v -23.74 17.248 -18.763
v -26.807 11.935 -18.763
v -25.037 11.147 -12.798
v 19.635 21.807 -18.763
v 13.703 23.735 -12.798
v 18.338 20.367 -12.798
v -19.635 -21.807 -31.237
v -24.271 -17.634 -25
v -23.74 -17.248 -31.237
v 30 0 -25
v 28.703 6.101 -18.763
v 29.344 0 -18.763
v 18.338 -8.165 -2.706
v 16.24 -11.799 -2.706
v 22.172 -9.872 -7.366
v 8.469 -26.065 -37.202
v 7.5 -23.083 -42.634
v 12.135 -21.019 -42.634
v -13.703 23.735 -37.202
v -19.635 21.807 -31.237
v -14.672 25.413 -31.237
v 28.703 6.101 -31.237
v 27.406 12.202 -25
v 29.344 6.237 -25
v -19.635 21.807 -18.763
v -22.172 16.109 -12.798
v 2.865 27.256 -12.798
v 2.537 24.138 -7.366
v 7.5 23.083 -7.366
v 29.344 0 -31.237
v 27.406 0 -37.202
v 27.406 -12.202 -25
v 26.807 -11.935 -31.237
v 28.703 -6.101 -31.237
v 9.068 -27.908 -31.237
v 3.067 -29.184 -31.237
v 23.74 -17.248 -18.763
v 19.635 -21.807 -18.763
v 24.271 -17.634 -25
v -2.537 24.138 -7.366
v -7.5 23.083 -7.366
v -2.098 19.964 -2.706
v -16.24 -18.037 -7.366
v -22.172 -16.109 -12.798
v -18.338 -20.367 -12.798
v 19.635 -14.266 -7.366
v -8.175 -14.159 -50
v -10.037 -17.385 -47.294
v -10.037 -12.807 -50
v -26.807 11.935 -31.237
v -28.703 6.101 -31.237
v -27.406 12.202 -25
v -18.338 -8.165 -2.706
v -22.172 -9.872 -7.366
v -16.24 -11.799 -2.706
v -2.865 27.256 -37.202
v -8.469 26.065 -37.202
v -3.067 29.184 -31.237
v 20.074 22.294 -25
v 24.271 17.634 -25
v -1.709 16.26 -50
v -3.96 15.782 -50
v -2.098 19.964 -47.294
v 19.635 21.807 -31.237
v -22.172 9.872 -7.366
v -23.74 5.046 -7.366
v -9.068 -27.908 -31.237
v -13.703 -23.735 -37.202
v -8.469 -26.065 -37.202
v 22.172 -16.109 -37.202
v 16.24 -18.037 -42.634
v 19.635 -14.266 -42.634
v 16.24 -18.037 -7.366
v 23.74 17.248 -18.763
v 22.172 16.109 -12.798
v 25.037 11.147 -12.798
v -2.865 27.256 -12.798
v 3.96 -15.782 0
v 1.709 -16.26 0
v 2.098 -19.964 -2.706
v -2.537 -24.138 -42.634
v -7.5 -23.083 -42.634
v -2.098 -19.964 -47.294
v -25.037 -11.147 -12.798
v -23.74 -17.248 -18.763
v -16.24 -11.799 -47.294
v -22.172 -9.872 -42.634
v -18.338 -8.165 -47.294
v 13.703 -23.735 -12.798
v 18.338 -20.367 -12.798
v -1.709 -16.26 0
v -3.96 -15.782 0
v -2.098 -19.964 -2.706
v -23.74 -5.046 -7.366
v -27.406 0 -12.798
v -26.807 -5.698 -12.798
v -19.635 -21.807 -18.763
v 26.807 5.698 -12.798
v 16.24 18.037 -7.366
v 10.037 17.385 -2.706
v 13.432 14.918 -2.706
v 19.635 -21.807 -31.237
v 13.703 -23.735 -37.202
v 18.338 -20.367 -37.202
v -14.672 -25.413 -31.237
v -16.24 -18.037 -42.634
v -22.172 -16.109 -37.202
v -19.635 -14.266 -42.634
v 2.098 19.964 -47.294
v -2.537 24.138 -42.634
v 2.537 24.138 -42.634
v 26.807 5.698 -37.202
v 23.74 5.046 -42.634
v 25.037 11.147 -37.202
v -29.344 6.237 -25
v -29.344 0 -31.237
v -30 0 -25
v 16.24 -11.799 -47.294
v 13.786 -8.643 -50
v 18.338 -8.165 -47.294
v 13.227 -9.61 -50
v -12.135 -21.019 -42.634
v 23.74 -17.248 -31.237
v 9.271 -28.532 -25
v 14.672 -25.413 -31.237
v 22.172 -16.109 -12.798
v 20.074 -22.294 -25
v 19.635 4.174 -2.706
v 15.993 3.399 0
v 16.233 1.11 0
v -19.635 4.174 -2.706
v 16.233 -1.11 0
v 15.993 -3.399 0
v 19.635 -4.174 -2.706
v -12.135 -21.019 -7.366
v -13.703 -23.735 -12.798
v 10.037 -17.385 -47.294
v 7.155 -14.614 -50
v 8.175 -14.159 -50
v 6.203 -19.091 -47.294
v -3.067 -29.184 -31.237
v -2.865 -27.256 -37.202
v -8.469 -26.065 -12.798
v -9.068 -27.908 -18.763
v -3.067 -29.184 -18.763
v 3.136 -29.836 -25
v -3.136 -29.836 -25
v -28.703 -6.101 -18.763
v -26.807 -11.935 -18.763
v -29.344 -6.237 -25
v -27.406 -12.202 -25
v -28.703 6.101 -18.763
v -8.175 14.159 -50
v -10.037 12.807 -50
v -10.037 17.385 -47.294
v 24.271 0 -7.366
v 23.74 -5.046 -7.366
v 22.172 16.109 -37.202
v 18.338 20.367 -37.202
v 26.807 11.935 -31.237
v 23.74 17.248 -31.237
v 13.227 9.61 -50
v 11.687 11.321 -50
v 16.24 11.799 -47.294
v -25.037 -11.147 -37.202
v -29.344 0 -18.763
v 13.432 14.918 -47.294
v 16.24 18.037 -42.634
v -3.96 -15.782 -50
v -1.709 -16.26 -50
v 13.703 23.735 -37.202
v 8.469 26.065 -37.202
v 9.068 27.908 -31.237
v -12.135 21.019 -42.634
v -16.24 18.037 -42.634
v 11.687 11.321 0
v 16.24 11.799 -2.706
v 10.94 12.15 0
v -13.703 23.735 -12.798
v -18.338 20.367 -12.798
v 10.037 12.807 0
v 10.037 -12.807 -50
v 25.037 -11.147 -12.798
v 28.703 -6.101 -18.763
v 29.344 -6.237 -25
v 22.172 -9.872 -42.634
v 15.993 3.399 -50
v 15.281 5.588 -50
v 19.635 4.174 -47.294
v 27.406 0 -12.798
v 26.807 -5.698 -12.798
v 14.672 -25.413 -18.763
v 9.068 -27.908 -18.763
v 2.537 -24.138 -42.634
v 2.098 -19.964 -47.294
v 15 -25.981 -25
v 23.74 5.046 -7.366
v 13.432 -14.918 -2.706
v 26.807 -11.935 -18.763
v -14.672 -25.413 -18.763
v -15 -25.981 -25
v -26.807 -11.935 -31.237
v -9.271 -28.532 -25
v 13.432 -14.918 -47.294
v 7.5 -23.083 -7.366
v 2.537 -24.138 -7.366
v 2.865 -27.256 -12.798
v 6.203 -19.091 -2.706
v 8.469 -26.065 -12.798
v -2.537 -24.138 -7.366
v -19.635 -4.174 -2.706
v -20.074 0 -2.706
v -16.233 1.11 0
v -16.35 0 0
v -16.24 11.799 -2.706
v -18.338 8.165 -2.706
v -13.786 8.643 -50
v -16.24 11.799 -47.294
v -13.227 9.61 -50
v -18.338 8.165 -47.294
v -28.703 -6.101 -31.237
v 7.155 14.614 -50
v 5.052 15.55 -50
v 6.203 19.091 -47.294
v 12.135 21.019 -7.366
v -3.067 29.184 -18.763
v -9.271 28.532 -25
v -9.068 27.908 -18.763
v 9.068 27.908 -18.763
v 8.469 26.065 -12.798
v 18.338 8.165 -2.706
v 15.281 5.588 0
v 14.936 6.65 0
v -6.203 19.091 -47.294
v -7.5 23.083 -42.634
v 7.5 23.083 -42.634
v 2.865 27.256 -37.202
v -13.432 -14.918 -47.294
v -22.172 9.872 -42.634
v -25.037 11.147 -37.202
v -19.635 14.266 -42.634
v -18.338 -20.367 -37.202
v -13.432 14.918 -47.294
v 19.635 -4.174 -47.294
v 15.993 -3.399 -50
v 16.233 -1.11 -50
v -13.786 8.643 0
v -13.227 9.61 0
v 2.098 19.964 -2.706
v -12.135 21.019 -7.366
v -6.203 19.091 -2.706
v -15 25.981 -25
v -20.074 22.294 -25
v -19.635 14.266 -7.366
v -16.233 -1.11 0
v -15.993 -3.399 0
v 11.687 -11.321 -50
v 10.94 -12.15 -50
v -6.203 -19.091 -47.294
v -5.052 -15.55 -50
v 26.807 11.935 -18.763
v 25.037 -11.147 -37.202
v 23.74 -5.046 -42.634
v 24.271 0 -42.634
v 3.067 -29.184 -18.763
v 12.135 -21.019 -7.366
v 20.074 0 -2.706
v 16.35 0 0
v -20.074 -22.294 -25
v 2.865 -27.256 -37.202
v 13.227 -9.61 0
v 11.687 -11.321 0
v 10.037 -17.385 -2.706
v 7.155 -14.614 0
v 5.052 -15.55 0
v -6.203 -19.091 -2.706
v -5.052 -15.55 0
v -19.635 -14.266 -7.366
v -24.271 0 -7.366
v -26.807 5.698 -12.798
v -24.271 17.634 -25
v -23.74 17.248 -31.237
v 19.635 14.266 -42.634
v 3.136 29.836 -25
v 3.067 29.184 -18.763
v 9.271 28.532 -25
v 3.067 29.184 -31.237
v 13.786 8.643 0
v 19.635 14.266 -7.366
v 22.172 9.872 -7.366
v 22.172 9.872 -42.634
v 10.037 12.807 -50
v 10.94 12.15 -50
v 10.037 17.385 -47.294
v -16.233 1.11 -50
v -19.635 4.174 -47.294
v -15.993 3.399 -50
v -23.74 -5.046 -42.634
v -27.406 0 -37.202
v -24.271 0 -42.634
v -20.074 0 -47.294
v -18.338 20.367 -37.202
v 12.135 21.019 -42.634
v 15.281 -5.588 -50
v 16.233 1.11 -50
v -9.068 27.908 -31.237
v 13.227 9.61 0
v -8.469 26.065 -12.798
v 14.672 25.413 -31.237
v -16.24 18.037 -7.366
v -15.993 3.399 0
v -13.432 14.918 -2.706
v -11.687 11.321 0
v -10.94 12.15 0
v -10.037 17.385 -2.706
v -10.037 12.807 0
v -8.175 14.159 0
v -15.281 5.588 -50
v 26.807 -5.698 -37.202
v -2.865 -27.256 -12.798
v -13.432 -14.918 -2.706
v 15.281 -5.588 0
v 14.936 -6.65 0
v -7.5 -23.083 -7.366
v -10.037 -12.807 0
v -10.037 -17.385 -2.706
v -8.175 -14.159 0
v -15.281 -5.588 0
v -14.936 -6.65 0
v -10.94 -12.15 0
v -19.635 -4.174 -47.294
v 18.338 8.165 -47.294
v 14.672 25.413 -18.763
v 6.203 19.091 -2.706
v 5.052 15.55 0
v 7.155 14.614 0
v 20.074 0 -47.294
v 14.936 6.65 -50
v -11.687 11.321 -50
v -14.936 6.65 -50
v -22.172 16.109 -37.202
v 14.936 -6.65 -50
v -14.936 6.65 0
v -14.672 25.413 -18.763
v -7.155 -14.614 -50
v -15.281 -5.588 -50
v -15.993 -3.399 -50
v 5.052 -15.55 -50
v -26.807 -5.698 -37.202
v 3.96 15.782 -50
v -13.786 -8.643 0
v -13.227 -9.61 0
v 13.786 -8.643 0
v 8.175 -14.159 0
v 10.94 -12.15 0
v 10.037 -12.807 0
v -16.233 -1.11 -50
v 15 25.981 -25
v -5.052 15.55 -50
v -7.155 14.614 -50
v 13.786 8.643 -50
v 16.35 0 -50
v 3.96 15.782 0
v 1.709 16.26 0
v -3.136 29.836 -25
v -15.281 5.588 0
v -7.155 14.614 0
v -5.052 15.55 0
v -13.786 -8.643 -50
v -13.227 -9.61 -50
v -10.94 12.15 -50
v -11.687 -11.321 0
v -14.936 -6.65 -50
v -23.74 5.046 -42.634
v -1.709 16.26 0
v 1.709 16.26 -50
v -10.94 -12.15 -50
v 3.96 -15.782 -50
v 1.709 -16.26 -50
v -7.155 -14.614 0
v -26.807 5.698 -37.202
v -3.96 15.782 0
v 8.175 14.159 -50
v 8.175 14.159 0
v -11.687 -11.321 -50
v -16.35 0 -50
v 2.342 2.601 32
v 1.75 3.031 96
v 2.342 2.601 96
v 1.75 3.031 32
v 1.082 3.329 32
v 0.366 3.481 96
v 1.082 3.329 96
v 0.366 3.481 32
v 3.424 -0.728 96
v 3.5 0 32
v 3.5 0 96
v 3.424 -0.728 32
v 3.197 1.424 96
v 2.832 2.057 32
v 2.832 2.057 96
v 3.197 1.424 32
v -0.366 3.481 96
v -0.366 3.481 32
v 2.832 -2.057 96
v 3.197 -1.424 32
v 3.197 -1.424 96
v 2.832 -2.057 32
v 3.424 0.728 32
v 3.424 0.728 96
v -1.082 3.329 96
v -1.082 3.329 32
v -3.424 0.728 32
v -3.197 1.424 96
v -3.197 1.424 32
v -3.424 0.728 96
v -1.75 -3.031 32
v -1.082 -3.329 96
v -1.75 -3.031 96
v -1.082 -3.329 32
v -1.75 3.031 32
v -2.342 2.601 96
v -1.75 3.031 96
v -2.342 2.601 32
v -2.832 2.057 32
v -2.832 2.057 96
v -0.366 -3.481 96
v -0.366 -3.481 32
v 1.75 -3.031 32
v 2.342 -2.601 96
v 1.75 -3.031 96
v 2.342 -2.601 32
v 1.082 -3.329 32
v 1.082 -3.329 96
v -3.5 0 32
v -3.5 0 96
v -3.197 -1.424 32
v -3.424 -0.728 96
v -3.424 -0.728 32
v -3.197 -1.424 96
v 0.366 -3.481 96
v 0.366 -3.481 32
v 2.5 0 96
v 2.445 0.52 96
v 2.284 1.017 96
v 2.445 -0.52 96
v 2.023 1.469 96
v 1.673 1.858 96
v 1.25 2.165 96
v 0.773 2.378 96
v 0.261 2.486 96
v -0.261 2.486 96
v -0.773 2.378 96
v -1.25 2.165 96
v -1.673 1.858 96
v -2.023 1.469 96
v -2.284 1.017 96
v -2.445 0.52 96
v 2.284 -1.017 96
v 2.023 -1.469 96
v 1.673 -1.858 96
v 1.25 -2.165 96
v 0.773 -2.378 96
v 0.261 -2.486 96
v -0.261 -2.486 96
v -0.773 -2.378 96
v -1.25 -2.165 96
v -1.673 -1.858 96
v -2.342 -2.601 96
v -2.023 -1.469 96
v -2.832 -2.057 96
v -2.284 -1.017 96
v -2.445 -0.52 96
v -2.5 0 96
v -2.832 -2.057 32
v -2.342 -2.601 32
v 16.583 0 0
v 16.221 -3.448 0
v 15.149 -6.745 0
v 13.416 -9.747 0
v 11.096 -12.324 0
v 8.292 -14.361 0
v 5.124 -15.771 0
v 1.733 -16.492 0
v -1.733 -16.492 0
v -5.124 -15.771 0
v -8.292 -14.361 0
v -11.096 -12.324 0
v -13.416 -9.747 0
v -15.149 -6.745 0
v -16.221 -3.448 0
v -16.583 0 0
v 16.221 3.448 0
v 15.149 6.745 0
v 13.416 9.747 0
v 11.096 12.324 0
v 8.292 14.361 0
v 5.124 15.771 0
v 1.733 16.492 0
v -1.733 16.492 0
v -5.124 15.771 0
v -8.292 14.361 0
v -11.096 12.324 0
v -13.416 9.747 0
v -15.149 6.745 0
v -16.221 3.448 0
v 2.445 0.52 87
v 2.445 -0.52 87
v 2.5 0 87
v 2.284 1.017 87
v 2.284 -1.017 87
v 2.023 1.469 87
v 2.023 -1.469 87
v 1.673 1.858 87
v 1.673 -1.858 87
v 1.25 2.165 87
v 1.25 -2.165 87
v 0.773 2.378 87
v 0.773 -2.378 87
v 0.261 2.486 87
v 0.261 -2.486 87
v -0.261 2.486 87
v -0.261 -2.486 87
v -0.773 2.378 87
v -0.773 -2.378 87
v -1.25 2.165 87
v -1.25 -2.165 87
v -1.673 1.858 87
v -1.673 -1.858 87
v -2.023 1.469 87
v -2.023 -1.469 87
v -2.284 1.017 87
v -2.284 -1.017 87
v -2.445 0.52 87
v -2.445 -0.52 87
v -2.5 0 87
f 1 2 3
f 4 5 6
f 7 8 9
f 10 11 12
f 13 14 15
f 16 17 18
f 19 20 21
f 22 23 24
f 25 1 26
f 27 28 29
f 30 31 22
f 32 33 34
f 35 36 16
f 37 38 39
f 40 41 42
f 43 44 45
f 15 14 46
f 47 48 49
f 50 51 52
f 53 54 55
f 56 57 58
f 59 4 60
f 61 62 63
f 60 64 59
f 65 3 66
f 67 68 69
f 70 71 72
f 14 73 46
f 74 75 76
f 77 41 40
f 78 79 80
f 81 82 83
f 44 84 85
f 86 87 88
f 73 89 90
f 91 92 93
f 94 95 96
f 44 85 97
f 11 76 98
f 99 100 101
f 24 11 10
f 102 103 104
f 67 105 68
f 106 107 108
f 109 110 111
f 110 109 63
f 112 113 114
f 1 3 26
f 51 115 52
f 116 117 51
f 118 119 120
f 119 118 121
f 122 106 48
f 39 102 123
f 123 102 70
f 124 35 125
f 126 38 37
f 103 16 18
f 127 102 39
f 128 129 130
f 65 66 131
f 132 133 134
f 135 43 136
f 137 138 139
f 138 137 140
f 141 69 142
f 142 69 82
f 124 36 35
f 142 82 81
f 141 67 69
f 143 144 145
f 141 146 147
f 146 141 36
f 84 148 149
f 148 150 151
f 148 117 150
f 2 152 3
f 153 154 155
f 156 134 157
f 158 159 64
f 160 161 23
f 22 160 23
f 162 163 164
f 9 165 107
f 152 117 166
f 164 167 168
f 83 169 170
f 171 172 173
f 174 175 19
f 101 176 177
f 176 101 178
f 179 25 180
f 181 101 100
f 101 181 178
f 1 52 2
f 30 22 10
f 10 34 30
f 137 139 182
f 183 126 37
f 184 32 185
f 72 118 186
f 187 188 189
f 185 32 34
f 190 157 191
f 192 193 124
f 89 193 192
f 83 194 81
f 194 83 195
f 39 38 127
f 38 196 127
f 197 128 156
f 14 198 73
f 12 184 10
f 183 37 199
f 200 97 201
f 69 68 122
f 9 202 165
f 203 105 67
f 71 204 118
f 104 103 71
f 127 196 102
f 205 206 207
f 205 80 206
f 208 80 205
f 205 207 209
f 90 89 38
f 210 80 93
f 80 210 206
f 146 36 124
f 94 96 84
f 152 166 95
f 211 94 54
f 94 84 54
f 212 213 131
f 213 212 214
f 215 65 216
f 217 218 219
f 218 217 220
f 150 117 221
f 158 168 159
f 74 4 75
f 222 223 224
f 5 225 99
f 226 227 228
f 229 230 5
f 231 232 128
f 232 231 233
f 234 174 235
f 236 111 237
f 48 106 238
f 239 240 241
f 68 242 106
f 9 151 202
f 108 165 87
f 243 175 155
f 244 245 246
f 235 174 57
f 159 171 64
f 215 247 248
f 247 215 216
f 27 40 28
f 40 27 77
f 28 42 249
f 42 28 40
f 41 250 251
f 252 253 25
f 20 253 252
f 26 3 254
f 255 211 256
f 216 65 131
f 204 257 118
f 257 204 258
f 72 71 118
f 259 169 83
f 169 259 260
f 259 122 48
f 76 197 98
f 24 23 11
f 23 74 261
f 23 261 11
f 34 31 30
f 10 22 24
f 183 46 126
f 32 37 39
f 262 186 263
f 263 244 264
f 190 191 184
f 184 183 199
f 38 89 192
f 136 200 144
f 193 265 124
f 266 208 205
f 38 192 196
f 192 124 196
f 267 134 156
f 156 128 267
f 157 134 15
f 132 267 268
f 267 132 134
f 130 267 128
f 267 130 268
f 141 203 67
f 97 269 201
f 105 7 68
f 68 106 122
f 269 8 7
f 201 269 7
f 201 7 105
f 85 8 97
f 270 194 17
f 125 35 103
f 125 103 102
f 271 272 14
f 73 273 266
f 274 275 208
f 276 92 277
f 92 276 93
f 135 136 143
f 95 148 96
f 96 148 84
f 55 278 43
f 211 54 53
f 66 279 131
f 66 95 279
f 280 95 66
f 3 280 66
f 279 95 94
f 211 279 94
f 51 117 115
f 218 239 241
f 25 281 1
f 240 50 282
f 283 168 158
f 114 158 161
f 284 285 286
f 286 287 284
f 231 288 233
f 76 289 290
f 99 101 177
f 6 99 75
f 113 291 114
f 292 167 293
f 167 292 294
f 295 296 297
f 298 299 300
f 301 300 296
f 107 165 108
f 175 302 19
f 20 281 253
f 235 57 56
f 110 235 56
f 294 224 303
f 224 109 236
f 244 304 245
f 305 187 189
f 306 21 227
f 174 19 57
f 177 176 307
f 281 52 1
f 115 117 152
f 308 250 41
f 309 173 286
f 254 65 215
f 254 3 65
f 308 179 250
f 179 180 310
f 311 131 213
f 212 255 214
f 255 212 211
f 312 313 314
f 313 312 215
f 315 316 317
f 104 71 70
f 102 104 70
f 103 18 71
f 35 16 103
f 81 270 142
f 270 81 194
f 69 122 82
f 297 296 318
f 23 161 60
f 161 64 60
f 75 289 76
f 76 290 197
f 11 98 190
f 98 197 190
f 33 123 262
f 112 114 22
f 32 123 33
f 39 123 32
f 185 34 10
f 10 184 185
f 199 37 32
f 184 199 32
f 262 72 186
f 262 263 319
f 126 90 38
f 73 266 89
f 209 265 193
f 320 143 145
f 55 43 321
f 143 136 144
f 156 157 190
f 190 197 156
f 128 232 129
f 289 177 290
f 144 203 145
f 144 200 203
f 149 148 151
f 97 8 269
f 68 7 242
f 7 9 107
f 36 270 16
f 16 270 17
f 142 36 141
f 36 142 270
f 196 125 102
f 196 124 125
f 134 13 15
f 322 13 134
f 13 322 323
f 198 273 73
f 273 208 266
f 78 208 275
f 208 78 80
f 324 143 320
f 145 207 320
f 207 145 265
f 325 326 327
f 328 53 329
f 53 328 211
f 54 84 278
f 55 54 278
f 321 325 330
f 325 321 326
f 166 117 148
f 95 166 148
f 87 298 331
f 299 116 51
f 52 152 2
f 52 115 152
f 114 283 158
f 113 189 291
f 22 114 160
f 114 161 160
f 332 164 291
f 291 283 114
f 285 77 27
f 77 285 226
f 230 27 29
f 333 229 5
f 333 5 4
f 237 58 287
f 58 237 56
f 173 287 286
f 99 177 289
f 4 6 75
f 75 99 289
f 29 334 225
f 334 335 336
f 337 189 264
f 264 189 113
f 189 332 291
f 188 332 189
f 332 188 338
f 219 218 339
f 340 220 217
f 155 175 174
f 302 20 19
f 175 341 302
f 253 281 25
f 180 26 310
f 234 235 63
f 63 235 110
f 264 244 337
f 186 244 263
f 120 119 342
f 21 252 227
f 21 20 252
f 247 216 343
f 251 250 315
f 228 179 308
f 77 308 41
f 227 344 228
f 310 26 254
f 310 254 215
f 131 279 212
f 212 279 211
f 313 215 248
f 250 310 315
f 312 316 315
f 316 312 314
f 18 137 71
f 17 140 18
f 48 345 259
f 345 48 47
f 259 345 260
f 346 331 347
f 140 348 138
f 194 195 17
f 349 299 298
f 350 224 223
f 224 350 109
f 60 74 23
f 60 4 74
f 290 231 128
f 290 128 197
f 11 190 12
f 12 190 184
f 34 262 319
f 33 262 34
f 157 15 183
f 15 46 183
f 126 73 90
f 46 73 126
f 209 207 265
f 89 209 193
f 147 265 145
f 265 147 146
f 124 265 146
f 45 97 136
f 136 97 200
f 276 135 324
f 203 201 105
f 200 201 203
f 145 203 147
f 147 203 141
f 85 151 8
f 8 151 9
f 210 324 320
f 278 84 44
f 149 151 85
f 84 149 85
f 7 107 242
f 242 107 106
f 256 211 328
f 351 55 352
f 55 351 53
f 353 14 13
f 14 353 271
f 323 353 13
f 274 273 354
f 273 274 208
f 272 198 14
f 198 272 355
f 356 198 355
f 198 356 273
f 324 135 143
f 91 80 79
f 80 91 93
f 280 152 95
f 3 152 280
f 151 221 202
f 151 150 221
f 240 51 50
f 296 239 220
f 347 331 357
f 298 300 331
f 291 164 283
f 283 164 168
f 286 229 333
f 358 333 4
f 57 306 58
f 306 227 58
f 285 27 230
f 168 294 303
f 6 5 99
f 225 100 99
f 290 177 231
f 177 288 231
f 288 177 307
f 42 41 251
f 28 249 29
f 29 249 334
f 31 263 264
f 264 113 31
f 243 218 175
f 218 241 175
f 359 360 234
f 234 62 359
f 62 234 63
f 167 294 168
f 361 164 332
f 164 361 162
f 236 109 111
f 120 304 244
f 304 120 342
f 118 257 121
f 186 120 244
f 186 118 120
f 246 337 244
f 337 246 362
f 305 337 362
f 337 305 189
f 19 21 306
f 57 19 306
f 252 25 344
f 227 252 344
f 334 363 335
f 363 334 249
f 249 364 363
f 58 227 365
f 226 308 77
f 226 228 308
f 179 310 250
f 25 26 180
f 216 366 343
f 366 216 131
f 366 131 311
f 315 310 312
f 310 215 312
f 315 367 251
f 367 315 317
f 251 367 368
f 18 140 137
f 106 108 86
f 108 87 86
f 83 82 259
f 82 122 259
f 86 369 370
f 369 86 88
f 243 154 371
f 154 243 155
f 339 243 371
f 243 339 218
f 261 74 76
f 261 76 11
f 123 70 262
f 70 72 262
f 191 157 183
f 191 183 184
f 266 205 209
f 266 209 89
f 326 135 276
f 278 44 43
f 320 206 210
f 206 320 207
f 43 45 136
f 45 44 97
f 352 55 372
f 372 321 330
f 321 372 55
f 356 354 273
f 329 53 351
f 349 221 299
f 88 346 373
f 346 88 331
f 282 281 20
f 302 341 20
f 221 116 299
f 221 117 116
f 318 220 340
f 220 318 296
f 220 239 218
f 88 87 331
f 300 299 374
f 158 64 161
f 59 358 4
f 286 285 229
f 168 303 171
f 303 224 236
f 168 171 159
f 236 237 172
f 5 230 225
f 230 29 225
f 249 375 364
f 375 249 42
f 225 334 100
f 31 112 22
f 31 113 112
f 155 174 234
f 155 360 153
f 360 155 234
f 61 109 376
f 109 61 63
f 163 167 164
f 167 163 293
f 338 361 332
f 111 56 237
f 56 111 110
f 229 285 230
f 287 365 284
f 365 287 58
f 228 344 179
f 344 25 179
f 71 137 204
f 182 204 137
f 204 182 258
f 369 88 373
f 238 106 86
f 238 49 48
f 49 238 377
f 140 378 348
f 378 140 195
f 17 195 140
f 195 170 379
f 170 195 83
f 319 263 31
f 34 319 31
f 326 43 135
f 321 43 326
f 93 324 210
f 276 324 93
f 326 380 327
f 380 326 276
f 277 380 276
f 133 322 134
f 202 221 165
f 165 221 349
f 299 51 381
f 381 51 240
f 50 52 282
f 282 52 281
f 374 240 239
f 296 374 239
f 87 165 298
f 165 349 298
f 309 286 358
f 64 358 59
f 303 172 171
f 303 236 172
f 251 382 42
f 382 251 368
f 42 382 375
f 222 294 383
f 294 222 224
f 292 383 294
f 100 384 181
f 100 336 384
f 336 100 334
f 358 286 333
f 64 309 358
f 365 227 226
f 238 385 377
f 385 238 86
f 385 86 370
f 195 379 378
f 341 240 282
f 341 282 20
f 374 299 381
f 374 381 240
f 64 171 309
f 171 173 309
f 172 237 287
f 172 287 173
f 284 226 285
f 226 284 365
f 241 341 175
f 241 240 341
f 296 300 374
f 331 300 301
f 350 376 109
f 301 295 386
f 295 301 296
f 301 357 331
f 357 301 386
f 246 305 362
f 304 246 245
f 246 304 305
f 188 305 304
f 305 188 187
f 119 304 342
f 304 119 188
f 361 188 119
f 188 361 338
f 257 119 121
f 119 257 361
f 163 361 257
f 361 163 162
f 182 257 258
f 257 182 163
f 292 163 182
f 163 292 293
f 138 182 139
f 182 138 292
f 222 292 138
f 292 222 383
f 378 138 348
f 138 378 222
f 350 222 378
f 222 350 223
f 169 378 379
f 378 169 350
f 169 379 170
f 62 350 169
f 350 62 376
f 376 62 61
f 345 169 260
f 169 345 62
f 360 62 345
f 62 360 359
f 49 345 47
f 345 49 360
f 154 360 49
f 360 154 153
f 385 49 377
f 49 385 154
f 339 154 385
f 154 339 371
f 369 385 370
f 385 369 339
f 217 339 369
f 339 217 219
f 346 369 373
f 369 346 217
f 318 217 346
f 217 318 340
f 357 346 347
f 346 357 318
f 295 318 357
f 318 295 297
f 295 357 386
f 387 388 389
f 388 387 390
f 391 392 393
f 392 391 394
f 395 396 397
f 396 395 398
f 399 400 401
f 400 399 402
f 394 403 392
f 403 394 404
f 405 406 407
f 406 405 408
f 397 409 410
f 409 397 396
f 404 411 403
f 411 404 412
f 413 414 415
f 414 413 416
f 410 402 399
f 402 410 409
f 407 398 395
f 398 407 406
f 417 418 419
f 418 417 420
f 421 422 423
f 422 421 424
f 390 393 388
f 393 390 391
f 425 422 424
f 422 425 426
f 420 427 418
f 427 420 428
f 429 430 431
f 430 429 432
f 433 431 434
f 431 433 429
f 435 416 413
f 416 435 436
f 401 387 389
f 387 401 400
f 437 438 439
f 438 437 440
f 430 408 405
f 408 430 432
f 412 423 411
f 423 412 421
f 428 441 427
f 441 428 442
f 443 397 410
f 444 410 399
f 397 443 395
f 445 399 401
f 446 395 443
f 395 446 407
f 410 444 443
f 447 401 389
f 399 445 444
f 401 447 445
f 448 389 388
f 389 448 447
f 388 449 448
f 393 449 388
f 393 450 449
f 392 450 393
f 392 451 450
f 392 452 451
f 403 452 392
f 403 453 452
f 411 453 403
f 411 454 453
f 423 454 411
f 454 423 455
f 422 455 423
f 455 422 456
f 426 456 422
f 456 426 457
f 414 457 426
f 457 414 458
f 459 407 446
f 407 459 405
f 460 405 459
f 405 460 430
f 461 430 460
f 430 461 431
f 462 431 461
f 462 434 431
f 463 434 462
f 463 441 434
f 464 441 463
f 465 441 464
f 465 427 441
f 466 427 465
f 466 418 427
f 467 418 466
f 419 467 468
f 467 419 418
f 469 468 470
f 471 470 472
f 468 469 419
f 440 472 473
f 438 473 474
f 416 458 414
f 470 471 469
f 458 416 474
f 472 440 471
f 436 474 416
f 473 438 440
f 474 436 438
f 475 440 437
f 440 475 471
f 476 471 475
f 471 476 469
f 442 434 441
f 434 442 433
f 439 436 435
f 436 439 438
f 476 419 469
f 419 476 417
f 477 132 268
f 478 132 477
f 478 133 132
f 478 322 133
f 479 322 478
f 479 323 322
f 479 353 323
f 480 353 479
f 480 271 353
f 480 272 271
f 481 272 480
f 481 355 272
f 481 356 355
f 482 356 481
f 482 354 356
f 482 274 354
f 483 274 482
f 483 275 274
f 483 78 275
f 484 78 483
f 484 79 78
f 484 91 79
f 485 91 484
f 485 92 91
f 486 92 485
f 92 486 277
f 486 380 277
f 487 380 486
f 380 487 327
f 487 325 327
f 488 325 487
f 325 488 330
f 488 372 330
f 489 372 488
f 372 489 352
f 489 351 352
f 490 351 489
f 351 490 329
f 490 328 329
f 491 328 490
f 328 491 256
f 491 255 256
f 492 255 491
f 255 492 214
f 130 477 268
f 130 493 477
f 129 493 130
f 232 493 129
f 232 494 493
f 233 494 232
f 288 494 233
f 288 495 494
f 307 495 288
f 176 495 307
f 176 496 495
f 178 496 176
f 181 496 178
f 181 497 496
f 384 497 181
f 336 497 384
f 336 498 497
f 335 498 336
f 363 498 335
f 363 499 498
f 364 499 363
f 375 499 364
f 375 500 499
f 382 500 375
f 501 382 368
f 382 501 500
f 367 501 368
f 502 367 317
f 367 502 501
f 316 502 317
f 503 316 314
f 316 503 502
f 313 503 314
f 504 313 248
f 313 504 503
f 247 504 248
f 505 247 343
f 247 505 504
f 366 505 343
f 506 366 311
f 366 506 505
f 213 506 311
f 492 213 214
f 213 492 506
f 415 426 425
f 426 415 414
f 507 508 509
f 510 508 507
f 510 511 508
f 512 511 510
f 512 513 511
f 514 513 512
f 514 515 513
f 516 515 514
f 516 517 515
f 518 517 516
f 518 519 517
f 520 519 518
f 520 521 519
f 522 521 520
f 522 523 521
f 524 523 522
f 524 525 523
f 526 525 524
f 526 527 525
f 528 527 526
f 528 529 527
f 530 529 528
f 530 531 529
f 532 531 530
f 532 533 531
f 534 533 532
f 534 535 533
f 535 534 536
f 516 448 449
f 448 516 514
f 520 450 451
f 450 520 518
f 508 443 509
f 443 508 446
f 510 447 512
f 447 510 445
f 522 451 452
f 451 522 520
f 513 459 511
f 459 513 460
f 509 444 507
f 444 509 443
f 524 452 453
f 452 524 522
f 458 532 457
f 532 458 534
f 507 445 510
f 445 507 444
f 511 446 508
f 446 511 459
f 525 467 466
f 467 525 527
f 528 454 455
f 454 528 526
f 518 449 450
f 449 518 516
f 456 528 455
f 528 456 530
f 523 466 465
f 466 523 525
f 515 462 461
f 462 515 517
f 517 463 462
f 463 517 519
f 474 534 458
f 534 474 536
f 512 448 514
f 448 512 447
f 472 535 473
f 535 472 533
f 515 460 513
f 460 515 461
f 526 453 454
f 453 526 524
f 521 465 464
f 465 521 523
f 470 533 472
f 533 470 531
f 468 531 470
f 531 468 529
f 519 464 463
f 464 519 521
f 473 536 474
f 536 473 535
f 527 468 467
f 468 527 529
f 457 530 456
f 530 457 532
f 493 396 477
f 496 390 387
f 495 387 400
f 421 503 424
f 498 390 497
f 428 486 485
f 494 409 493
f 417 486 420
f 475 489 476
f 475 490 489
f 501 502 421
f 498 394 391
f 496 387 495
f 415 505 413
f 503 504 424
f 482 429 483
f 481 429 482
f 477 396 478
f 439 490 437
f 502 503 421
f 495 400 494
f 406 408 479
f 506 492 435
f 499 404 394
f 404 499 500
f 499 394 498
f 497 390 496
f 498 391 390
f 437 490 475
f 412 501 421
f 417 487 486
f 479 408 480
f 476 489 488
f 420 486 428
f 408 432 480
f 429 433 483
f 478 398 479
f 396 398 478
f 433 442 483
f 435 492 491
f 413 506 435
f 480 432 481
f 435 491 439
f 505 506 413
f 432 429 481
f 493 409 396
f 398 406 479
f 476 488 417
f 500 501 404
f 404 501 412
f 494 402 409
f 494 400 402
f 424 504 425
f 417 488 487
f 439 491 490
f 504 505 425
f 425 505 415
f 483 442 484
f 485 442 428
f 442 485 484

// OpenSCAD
// Ball Diameter
ball_d = 60;  // [20:90]
// Stylus Length
stylus = 96;  // [20:230]
// Surface Smoothing
smooth = 30;  // [30:100]

$fn = smooth;
ball = ball_d/2;
union()
{
cylinder (h=stylus/3, r1=ball*sin(acos((ball-5)/ball)), r2=3.5);
difference()
{
translate([0,0,-ball+5])
sphere(ball);
translate([-ball, -ball, -ball*4+10])
cube(ball*2);
}
difference()
{
cylinder (h=stylus, r1=3.5, r2=3.5);
translate([0,0,stylus-9])
cylinder (h=9, r1=2.5, r2=2.5);
}
}
